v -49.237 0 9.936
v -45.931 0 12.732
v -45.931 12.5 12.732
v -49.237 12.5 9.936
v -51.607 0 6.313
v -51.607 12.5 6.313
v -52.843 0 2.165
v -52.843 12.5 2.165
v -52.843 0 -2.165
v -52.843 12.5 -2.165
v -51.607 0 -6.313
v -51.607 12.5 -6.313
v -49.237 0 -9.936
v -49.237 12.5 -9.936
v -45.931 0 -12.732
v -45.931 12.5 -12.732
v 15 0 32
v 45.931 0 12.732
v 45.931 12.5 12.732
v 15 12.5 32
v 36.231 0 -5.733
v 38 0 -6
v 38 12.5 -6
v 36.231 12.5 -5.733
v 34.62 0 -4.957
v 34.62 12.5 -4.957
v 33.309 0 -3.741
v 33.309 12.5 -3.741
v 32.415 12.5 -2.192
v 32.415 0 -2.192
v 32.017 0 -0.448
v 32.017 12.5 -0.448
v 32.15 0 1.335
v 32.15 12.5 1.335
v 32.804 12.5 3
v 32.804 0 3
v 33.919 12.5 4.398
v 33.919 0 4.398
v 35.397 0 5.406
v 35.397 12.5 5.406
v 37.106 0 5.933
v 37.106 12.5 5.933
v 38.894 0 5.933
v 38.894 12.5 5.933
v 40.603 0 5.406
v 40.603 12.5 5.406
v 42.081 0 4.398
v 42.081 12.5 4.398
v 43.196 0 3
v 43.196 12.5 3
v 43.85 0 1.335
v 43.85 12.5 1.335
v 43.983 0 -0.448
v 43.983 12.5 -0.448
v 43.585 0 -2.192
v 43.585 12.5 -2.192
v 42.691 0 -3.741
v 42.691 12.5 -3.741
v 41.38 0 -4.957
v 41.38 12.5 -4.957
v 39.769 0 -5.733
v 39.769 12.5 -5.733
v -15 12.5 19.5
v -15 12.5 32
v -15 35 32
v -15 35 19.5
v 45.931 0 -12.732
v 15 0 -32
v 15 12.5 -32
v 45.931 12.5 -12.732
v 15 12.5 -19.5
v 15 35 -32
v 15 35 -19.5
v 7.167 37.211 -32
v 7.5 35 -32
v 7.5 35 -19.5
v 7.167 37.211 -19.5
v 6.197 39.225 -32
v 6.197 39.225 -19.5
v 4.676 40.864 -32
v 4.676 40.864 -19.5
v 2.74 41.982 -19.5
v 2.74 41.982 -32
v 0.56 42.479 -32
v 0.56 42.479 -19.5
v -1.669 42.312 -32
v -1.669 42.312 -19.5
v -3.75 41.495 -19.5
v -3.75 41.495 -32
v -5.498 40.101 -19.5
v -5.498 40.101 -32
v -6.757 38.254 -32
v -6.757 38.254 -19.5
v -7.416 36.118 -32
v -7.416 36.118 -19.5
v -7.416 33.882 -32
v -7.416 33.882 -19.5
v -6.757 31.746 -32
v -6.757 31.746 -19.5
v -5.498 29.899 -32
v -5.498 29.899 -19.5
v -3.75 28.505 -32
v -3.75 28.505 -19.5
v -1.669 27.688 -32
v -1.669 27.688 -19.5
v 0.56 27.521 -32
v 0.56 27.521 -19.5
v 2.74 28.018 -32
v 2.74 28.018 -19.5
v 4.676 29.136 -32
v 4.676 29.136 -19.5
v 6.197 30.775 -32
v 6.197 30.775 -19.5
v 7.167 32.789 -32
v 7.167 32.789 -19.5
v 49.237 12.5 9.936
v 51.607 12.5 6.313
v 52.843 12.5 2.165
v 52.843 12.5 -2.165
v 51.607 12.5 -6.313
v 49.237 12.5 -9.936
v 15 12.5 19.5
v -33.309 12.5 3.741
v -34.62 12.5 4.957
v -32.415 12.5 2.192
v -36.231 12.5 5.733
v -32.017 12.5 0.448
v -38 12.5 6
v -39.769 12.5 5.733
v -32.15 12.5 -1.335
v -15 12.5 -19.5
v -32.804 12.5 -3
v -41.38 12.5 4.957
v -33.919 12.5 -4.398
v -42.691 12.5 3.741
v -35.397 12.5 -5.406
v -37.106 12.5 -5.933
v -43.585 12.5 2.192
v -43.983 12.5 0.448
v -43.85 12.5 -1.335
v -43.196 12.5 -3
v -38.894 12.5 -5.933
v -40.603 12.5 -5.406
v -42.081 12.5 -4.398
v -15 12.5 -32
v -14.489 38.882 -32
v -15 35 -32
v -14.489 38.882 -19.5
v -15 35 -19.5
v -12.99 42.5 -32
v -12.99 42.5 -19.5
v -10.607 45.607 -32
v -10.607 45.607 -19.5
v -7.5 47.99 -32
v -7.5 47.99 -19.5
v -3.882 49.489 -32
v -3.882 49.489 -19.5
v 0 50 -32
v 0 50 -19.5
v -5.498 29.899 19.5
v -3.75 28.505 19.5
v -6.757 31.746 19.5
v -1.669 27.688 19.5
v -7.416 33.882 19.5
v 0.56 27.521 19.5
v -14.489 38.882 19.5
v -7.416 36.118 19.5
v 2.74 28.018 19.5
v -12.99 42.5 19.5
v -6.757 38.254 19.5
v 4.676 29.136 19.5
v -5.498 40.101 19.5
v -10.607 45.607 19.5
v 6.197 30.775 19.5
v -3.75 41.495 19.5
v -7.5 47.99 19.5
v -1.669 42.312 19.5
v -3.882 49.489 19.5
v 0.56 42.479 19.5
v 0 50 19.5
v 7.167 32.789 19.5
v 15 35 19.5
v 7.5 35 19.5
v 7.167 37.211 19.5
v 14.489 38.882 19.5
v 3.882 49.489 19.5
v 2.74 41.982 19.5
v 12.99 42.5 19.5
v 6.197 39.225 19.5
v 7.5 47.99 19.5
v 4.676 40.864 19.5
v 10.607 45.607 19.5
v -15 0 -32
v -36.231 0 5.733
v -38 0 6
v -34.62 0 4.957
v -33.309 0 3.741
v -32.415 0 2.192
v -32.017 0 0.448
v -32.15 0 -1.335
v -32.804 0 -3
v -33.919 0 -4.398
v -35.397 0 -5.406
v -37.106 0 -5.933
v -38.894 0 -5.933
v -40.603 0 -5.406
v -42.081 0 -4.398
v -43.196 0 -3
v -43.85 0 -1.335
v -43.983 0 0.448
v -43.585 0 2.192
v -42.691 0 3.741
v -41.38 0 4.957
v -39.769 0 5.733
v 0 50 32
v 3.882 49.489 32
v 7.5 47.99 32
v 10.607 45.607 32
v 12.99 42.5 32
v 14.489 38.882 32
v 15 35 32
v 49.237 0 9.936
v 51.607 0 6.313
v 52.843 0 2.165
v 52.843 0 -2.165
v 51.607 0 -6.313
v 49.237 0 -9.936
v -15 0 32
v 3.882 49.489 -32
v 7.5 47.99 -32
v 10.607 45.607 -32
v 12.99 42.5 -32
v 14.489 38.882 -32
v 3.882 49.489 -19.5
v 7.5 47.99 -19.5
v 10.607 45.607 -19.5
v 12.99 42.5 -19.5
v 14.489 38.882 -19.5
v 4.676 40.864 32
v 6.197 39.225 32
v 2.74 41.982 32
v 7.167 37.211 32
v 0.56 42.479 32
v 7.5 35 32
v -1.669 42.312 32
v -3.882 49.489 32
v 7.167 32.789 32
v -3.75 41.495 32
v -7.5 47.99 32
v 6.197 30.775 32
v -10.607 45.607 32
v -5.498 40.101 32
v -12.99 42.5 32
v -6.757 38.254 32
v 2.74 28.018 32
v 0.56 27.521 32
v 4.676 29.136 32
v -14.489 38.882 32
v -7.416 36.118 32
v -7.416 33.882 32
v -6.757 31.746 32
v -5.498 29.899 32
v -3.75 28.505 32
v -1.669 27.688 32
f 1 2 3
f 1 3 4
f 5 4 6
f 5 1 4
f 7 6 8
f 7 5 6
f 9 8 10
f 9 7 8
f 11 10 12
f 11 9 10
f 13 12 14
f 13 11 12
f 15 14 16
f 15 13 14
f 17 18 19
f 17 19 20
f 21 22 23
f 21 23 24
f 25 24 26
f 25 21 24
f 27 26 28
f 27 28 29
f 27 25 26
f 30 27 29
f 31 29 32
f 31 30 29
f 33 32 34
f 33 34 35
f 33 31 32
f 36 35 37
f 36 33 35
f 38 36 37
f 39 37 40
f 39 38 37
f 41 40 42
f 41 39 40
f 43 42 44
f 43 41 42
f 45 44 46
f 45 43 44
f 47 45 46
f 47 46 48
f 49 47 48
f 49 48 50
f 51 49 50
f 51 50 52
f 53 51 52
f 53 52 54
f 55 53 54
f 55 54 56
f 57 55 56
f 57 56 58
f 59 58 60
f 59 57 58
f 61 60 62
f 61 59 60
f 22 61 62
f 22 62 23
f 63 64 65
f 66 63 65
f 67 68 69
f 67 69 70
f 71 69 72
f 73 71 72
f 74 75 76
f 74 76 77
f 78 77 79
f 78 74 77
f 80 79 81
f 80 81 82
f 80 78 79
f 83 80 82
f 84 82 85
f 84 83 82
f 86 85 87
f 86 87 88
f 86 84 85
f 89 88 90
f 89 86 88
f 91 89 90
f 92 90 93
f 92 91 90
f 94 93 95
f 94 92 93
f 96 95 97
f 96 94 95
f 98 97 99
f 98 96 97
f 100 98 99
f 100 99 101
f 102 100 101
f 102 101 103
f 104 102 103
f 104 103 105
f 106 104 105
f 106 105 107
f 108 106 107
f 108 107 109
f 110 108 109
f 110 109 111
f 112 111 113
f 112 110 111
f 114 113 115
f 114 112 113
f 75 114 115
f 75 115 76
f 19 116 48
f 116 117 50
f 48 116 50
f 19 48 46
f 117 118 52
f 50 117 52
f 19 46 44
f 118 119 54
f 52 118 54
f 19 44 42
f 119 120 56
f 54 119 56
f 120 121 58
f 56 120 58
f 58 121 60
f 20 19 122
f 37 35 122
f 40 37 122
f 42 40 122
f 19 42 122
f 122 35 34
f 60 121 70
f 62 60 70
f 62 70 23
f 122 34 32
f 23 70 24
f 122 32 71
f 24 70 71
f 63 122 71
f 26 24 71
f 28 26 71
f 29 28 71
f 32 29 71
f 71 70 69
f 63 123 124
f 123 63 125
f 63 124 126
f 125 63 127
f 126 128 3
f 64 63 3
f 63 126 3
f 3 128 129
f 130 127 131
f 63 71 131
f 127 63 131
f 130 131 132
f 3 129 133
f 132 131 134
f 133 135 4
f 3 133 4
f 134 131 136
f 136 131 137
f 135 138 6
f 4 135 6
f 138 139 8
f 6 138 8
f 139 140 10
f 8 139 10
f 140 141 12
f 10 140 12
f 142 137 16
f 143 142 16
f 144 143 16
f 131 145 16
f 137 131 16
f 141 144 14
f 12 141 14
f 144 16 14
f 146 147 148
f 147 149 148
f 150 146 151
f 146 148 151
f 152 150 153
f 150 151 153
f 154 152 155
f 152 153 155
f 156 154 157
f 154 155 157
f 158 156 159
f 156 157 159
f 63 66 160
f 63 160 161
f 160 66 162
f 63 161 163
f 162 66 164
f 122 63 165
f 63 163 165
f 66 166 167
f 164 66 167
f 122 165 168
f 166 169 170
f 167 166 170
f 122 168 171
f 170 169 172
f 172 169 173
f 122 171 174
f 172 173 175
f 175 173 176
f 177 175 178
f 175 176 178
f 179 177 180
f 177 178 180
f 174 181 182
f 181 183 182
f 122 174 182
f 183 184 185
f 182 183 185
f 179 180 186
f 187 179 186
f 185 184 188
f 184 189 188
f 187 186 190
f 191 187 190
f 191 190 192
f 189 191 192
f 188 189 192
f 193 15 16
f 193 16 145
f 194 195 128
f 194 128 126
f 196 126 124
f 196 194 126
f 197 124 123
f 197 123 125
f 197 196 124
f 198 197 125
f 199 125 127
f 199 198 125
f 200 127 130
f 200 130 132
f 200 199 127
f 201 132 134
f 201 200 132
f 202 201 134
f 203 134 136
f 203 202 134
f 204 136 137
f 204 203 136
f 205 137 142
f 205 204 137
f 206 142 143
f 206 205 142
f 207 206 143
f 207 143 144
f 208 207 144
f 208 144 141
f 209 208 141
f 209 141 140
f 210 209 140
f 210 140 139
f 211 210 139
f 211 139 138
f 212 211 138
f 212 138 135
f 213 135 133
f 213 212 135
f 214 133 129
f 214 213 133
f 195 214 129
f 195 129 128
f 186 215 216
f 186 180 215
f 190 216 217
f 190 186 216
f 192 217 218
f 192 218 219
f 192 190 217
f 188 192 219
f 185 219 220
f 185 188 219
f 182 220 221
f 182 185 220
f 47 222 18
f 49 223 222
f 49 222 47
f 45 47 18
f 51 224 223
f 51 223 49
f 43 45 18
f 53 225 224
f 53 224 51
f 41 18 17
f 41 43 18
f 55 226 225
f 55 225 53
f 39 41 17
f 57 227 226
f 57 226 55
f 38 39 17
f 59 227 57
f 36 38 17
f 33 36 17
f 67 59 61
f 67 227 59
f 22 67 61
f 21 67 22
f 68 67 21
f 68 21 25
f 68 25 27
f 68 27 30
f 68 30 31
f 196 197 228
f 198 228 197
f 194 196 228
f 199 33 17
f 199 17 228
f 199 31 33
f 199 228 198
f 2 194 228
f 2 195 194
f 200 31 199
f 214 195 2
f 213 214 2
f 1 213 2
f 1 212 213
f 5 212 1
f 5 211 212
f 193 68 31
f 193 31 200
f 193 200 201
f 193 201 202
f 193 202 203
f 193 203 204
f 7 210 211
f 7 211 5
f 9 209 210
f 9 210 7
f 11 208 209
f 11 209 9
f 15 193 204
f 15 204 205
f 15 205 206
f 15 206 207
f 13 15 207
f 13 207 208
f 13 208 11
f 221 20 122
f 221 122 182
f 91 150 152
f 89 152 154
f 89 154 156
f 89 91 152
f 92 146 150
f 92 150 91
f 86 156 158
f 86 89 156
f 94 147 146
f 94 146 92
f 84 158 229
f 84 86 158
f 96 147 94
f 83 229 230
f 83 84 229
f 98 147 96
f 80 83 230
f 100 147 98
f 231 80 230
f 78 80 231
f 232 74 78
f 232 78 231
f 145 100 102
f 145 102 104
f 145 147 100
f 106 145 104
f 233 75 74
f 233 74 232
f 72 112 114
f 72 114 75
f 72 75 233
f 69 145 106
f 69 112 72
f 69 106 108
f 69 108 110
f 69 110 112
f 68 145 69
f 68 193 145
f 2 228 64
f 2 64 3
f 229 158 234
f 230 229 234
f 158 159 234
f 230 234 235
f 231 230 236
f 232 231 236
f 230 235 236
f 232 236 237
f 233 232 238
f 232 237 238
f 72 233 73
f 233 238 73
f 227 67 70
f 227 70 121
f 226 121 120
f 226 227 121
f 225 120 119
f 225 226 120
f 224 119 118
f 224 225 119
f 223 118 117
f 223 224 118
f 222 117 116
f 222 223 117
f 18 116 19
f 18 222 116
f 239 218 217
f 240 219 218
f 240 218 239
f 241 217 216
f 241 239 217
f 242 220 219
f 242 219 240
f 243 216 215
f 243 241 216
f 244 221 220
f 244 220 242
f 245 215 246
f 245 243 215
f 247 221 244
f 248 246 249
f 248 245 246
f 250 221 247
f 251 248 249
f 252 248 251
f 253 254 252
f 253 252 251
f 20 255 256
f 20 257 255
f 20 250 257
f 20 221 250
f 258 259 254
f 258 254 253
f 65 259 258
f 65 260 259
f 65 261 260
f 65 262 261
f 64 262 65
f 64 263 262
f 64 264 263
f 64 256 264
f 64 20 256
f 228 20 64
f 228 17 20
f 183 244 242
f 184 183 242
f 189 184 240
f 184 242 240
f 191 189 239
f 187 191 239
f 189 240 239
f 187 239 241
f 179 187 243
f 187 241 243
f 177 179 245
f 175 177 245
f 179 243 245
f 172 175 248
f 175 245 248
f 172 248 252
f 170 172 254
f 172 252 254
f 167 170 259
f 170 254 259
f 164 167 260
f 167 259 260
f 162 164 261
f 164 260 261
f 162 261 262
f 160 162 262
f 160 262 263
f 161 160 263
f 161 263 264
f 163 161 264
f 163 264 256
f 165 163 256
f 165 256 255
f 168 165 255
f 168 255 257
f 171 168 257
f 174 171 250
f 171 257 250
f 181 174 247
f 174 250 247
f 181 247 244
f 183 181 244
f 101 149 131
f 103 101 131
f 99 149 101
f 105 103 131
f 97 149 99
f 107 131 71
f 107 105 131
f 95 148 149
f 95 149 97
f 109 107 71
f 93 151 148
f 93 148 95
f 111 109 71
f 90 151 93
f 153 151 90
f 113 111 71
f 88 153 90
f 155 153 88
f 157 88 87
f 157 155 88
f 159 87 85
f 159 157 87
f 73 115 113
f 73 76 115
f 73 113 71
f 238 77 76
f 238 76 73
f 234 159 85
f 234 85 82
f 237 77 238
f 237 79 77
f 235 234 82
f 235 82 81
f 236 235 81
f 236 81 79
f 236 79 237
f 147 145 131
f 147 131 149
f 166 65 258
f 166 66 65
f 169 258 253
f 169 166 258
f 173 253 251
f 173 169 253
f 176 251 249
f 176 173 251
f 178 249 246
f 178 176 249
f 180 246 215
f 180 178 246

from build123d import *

# Parameters (mm, degrees)
SKETCH1_R            = 6
BOSS_EXTRUDE1_DEPTH  = 12.5
SKETCH2_W            = 30
SKETCH2_H            = 50
SKETCH2_R            = 7.5
BOSS_EXTRUDE2_DEPTH  = 12.5
FILLET1_R            = 15
FILLET1_OF_MIRROR1_R = 15


with BuildPart() as part:
    # Sketch1 → Boss-Extrude1 (new body)
    with BuildSketch(Plane(origin=(0, 0, 0), x_dir=(1, 0, 0), z_dir=(0, 1, 0))):
        with BuildLine():
            Line((-45.931122004, 12.73174394), (-15, 32))
            Line((-15, 32), (15, 32))
            Line((15, 32), (45.931122004, 12.73174394))
            ThreePointArc((45.931122004, 12.73174394), (53, 0), (45.931122004, -12.73174394))
            Line((45.931122004, -12.73174394), (15, -32))
            Line((15, -32), (-15, -32))
            Line((-15, -32), (-45.931122004, -12.73174394))
            ThreePointArc((-45.931122004, -12.73174394), (-53, 0), (-45.931122004, 12.73174394))
        make_face()
        with Locations(Location((-38, 0, 0), (0, 0, 270))):
            Circle(SKETCH1_R, mode=Mode.SUBTRACT)
        with Locations(Location((38, 0, 0), (0, 0, 90))):
            Circle(SKETCH1_R, mode=Mode.SUBTRACT)
    extrude(amount=BOSS_EXTRUDE1_DEPTH)

    # Sketch2 → Boss-Extrude2 (add)
    with BuildSketch(Plane.XY.offset(32)):
        with Locations((0, 25)):
            Rectangle(SKETCH2_W, SKETCH2_H)
        with Locations((0, 35)):
            Circle(SKETCH2_R, mode=Mode.SUBTRACT)
    boss_extrude2 = extrude(amount=-BOSS_EXTRUDE2_DEPTH)

    # Fillet1
    fillet1_edges = [part.edges().sort_by_distance(p)[0] for p in [
        (15, 50, 25.75),
        (-15, 50, 25.75),
    ]]
    fillet(fillet1_edges, radius=FILLET1_R - 0.0001)  # a hair under: the kernel refuses the full size

    # Mirror1: Boss-Extrude2 across plane
    add(boss_extrude2.mirror(Plane.XY))

    # Fillet1 of Mirror1
    fillet1_of_mirror1_edges = [part.edges().sort_by_distance(p)[0] for p in [
        (15, 50, -25.75),
        (-15, 50, -25.75),
    ]]
    fillet(fillet1_of_mirror1_edges, radius=FILLET1_OF_MIRROR1_R - 0.0001)  # a hair under: the kernel refuses the full size


solid = part.part
